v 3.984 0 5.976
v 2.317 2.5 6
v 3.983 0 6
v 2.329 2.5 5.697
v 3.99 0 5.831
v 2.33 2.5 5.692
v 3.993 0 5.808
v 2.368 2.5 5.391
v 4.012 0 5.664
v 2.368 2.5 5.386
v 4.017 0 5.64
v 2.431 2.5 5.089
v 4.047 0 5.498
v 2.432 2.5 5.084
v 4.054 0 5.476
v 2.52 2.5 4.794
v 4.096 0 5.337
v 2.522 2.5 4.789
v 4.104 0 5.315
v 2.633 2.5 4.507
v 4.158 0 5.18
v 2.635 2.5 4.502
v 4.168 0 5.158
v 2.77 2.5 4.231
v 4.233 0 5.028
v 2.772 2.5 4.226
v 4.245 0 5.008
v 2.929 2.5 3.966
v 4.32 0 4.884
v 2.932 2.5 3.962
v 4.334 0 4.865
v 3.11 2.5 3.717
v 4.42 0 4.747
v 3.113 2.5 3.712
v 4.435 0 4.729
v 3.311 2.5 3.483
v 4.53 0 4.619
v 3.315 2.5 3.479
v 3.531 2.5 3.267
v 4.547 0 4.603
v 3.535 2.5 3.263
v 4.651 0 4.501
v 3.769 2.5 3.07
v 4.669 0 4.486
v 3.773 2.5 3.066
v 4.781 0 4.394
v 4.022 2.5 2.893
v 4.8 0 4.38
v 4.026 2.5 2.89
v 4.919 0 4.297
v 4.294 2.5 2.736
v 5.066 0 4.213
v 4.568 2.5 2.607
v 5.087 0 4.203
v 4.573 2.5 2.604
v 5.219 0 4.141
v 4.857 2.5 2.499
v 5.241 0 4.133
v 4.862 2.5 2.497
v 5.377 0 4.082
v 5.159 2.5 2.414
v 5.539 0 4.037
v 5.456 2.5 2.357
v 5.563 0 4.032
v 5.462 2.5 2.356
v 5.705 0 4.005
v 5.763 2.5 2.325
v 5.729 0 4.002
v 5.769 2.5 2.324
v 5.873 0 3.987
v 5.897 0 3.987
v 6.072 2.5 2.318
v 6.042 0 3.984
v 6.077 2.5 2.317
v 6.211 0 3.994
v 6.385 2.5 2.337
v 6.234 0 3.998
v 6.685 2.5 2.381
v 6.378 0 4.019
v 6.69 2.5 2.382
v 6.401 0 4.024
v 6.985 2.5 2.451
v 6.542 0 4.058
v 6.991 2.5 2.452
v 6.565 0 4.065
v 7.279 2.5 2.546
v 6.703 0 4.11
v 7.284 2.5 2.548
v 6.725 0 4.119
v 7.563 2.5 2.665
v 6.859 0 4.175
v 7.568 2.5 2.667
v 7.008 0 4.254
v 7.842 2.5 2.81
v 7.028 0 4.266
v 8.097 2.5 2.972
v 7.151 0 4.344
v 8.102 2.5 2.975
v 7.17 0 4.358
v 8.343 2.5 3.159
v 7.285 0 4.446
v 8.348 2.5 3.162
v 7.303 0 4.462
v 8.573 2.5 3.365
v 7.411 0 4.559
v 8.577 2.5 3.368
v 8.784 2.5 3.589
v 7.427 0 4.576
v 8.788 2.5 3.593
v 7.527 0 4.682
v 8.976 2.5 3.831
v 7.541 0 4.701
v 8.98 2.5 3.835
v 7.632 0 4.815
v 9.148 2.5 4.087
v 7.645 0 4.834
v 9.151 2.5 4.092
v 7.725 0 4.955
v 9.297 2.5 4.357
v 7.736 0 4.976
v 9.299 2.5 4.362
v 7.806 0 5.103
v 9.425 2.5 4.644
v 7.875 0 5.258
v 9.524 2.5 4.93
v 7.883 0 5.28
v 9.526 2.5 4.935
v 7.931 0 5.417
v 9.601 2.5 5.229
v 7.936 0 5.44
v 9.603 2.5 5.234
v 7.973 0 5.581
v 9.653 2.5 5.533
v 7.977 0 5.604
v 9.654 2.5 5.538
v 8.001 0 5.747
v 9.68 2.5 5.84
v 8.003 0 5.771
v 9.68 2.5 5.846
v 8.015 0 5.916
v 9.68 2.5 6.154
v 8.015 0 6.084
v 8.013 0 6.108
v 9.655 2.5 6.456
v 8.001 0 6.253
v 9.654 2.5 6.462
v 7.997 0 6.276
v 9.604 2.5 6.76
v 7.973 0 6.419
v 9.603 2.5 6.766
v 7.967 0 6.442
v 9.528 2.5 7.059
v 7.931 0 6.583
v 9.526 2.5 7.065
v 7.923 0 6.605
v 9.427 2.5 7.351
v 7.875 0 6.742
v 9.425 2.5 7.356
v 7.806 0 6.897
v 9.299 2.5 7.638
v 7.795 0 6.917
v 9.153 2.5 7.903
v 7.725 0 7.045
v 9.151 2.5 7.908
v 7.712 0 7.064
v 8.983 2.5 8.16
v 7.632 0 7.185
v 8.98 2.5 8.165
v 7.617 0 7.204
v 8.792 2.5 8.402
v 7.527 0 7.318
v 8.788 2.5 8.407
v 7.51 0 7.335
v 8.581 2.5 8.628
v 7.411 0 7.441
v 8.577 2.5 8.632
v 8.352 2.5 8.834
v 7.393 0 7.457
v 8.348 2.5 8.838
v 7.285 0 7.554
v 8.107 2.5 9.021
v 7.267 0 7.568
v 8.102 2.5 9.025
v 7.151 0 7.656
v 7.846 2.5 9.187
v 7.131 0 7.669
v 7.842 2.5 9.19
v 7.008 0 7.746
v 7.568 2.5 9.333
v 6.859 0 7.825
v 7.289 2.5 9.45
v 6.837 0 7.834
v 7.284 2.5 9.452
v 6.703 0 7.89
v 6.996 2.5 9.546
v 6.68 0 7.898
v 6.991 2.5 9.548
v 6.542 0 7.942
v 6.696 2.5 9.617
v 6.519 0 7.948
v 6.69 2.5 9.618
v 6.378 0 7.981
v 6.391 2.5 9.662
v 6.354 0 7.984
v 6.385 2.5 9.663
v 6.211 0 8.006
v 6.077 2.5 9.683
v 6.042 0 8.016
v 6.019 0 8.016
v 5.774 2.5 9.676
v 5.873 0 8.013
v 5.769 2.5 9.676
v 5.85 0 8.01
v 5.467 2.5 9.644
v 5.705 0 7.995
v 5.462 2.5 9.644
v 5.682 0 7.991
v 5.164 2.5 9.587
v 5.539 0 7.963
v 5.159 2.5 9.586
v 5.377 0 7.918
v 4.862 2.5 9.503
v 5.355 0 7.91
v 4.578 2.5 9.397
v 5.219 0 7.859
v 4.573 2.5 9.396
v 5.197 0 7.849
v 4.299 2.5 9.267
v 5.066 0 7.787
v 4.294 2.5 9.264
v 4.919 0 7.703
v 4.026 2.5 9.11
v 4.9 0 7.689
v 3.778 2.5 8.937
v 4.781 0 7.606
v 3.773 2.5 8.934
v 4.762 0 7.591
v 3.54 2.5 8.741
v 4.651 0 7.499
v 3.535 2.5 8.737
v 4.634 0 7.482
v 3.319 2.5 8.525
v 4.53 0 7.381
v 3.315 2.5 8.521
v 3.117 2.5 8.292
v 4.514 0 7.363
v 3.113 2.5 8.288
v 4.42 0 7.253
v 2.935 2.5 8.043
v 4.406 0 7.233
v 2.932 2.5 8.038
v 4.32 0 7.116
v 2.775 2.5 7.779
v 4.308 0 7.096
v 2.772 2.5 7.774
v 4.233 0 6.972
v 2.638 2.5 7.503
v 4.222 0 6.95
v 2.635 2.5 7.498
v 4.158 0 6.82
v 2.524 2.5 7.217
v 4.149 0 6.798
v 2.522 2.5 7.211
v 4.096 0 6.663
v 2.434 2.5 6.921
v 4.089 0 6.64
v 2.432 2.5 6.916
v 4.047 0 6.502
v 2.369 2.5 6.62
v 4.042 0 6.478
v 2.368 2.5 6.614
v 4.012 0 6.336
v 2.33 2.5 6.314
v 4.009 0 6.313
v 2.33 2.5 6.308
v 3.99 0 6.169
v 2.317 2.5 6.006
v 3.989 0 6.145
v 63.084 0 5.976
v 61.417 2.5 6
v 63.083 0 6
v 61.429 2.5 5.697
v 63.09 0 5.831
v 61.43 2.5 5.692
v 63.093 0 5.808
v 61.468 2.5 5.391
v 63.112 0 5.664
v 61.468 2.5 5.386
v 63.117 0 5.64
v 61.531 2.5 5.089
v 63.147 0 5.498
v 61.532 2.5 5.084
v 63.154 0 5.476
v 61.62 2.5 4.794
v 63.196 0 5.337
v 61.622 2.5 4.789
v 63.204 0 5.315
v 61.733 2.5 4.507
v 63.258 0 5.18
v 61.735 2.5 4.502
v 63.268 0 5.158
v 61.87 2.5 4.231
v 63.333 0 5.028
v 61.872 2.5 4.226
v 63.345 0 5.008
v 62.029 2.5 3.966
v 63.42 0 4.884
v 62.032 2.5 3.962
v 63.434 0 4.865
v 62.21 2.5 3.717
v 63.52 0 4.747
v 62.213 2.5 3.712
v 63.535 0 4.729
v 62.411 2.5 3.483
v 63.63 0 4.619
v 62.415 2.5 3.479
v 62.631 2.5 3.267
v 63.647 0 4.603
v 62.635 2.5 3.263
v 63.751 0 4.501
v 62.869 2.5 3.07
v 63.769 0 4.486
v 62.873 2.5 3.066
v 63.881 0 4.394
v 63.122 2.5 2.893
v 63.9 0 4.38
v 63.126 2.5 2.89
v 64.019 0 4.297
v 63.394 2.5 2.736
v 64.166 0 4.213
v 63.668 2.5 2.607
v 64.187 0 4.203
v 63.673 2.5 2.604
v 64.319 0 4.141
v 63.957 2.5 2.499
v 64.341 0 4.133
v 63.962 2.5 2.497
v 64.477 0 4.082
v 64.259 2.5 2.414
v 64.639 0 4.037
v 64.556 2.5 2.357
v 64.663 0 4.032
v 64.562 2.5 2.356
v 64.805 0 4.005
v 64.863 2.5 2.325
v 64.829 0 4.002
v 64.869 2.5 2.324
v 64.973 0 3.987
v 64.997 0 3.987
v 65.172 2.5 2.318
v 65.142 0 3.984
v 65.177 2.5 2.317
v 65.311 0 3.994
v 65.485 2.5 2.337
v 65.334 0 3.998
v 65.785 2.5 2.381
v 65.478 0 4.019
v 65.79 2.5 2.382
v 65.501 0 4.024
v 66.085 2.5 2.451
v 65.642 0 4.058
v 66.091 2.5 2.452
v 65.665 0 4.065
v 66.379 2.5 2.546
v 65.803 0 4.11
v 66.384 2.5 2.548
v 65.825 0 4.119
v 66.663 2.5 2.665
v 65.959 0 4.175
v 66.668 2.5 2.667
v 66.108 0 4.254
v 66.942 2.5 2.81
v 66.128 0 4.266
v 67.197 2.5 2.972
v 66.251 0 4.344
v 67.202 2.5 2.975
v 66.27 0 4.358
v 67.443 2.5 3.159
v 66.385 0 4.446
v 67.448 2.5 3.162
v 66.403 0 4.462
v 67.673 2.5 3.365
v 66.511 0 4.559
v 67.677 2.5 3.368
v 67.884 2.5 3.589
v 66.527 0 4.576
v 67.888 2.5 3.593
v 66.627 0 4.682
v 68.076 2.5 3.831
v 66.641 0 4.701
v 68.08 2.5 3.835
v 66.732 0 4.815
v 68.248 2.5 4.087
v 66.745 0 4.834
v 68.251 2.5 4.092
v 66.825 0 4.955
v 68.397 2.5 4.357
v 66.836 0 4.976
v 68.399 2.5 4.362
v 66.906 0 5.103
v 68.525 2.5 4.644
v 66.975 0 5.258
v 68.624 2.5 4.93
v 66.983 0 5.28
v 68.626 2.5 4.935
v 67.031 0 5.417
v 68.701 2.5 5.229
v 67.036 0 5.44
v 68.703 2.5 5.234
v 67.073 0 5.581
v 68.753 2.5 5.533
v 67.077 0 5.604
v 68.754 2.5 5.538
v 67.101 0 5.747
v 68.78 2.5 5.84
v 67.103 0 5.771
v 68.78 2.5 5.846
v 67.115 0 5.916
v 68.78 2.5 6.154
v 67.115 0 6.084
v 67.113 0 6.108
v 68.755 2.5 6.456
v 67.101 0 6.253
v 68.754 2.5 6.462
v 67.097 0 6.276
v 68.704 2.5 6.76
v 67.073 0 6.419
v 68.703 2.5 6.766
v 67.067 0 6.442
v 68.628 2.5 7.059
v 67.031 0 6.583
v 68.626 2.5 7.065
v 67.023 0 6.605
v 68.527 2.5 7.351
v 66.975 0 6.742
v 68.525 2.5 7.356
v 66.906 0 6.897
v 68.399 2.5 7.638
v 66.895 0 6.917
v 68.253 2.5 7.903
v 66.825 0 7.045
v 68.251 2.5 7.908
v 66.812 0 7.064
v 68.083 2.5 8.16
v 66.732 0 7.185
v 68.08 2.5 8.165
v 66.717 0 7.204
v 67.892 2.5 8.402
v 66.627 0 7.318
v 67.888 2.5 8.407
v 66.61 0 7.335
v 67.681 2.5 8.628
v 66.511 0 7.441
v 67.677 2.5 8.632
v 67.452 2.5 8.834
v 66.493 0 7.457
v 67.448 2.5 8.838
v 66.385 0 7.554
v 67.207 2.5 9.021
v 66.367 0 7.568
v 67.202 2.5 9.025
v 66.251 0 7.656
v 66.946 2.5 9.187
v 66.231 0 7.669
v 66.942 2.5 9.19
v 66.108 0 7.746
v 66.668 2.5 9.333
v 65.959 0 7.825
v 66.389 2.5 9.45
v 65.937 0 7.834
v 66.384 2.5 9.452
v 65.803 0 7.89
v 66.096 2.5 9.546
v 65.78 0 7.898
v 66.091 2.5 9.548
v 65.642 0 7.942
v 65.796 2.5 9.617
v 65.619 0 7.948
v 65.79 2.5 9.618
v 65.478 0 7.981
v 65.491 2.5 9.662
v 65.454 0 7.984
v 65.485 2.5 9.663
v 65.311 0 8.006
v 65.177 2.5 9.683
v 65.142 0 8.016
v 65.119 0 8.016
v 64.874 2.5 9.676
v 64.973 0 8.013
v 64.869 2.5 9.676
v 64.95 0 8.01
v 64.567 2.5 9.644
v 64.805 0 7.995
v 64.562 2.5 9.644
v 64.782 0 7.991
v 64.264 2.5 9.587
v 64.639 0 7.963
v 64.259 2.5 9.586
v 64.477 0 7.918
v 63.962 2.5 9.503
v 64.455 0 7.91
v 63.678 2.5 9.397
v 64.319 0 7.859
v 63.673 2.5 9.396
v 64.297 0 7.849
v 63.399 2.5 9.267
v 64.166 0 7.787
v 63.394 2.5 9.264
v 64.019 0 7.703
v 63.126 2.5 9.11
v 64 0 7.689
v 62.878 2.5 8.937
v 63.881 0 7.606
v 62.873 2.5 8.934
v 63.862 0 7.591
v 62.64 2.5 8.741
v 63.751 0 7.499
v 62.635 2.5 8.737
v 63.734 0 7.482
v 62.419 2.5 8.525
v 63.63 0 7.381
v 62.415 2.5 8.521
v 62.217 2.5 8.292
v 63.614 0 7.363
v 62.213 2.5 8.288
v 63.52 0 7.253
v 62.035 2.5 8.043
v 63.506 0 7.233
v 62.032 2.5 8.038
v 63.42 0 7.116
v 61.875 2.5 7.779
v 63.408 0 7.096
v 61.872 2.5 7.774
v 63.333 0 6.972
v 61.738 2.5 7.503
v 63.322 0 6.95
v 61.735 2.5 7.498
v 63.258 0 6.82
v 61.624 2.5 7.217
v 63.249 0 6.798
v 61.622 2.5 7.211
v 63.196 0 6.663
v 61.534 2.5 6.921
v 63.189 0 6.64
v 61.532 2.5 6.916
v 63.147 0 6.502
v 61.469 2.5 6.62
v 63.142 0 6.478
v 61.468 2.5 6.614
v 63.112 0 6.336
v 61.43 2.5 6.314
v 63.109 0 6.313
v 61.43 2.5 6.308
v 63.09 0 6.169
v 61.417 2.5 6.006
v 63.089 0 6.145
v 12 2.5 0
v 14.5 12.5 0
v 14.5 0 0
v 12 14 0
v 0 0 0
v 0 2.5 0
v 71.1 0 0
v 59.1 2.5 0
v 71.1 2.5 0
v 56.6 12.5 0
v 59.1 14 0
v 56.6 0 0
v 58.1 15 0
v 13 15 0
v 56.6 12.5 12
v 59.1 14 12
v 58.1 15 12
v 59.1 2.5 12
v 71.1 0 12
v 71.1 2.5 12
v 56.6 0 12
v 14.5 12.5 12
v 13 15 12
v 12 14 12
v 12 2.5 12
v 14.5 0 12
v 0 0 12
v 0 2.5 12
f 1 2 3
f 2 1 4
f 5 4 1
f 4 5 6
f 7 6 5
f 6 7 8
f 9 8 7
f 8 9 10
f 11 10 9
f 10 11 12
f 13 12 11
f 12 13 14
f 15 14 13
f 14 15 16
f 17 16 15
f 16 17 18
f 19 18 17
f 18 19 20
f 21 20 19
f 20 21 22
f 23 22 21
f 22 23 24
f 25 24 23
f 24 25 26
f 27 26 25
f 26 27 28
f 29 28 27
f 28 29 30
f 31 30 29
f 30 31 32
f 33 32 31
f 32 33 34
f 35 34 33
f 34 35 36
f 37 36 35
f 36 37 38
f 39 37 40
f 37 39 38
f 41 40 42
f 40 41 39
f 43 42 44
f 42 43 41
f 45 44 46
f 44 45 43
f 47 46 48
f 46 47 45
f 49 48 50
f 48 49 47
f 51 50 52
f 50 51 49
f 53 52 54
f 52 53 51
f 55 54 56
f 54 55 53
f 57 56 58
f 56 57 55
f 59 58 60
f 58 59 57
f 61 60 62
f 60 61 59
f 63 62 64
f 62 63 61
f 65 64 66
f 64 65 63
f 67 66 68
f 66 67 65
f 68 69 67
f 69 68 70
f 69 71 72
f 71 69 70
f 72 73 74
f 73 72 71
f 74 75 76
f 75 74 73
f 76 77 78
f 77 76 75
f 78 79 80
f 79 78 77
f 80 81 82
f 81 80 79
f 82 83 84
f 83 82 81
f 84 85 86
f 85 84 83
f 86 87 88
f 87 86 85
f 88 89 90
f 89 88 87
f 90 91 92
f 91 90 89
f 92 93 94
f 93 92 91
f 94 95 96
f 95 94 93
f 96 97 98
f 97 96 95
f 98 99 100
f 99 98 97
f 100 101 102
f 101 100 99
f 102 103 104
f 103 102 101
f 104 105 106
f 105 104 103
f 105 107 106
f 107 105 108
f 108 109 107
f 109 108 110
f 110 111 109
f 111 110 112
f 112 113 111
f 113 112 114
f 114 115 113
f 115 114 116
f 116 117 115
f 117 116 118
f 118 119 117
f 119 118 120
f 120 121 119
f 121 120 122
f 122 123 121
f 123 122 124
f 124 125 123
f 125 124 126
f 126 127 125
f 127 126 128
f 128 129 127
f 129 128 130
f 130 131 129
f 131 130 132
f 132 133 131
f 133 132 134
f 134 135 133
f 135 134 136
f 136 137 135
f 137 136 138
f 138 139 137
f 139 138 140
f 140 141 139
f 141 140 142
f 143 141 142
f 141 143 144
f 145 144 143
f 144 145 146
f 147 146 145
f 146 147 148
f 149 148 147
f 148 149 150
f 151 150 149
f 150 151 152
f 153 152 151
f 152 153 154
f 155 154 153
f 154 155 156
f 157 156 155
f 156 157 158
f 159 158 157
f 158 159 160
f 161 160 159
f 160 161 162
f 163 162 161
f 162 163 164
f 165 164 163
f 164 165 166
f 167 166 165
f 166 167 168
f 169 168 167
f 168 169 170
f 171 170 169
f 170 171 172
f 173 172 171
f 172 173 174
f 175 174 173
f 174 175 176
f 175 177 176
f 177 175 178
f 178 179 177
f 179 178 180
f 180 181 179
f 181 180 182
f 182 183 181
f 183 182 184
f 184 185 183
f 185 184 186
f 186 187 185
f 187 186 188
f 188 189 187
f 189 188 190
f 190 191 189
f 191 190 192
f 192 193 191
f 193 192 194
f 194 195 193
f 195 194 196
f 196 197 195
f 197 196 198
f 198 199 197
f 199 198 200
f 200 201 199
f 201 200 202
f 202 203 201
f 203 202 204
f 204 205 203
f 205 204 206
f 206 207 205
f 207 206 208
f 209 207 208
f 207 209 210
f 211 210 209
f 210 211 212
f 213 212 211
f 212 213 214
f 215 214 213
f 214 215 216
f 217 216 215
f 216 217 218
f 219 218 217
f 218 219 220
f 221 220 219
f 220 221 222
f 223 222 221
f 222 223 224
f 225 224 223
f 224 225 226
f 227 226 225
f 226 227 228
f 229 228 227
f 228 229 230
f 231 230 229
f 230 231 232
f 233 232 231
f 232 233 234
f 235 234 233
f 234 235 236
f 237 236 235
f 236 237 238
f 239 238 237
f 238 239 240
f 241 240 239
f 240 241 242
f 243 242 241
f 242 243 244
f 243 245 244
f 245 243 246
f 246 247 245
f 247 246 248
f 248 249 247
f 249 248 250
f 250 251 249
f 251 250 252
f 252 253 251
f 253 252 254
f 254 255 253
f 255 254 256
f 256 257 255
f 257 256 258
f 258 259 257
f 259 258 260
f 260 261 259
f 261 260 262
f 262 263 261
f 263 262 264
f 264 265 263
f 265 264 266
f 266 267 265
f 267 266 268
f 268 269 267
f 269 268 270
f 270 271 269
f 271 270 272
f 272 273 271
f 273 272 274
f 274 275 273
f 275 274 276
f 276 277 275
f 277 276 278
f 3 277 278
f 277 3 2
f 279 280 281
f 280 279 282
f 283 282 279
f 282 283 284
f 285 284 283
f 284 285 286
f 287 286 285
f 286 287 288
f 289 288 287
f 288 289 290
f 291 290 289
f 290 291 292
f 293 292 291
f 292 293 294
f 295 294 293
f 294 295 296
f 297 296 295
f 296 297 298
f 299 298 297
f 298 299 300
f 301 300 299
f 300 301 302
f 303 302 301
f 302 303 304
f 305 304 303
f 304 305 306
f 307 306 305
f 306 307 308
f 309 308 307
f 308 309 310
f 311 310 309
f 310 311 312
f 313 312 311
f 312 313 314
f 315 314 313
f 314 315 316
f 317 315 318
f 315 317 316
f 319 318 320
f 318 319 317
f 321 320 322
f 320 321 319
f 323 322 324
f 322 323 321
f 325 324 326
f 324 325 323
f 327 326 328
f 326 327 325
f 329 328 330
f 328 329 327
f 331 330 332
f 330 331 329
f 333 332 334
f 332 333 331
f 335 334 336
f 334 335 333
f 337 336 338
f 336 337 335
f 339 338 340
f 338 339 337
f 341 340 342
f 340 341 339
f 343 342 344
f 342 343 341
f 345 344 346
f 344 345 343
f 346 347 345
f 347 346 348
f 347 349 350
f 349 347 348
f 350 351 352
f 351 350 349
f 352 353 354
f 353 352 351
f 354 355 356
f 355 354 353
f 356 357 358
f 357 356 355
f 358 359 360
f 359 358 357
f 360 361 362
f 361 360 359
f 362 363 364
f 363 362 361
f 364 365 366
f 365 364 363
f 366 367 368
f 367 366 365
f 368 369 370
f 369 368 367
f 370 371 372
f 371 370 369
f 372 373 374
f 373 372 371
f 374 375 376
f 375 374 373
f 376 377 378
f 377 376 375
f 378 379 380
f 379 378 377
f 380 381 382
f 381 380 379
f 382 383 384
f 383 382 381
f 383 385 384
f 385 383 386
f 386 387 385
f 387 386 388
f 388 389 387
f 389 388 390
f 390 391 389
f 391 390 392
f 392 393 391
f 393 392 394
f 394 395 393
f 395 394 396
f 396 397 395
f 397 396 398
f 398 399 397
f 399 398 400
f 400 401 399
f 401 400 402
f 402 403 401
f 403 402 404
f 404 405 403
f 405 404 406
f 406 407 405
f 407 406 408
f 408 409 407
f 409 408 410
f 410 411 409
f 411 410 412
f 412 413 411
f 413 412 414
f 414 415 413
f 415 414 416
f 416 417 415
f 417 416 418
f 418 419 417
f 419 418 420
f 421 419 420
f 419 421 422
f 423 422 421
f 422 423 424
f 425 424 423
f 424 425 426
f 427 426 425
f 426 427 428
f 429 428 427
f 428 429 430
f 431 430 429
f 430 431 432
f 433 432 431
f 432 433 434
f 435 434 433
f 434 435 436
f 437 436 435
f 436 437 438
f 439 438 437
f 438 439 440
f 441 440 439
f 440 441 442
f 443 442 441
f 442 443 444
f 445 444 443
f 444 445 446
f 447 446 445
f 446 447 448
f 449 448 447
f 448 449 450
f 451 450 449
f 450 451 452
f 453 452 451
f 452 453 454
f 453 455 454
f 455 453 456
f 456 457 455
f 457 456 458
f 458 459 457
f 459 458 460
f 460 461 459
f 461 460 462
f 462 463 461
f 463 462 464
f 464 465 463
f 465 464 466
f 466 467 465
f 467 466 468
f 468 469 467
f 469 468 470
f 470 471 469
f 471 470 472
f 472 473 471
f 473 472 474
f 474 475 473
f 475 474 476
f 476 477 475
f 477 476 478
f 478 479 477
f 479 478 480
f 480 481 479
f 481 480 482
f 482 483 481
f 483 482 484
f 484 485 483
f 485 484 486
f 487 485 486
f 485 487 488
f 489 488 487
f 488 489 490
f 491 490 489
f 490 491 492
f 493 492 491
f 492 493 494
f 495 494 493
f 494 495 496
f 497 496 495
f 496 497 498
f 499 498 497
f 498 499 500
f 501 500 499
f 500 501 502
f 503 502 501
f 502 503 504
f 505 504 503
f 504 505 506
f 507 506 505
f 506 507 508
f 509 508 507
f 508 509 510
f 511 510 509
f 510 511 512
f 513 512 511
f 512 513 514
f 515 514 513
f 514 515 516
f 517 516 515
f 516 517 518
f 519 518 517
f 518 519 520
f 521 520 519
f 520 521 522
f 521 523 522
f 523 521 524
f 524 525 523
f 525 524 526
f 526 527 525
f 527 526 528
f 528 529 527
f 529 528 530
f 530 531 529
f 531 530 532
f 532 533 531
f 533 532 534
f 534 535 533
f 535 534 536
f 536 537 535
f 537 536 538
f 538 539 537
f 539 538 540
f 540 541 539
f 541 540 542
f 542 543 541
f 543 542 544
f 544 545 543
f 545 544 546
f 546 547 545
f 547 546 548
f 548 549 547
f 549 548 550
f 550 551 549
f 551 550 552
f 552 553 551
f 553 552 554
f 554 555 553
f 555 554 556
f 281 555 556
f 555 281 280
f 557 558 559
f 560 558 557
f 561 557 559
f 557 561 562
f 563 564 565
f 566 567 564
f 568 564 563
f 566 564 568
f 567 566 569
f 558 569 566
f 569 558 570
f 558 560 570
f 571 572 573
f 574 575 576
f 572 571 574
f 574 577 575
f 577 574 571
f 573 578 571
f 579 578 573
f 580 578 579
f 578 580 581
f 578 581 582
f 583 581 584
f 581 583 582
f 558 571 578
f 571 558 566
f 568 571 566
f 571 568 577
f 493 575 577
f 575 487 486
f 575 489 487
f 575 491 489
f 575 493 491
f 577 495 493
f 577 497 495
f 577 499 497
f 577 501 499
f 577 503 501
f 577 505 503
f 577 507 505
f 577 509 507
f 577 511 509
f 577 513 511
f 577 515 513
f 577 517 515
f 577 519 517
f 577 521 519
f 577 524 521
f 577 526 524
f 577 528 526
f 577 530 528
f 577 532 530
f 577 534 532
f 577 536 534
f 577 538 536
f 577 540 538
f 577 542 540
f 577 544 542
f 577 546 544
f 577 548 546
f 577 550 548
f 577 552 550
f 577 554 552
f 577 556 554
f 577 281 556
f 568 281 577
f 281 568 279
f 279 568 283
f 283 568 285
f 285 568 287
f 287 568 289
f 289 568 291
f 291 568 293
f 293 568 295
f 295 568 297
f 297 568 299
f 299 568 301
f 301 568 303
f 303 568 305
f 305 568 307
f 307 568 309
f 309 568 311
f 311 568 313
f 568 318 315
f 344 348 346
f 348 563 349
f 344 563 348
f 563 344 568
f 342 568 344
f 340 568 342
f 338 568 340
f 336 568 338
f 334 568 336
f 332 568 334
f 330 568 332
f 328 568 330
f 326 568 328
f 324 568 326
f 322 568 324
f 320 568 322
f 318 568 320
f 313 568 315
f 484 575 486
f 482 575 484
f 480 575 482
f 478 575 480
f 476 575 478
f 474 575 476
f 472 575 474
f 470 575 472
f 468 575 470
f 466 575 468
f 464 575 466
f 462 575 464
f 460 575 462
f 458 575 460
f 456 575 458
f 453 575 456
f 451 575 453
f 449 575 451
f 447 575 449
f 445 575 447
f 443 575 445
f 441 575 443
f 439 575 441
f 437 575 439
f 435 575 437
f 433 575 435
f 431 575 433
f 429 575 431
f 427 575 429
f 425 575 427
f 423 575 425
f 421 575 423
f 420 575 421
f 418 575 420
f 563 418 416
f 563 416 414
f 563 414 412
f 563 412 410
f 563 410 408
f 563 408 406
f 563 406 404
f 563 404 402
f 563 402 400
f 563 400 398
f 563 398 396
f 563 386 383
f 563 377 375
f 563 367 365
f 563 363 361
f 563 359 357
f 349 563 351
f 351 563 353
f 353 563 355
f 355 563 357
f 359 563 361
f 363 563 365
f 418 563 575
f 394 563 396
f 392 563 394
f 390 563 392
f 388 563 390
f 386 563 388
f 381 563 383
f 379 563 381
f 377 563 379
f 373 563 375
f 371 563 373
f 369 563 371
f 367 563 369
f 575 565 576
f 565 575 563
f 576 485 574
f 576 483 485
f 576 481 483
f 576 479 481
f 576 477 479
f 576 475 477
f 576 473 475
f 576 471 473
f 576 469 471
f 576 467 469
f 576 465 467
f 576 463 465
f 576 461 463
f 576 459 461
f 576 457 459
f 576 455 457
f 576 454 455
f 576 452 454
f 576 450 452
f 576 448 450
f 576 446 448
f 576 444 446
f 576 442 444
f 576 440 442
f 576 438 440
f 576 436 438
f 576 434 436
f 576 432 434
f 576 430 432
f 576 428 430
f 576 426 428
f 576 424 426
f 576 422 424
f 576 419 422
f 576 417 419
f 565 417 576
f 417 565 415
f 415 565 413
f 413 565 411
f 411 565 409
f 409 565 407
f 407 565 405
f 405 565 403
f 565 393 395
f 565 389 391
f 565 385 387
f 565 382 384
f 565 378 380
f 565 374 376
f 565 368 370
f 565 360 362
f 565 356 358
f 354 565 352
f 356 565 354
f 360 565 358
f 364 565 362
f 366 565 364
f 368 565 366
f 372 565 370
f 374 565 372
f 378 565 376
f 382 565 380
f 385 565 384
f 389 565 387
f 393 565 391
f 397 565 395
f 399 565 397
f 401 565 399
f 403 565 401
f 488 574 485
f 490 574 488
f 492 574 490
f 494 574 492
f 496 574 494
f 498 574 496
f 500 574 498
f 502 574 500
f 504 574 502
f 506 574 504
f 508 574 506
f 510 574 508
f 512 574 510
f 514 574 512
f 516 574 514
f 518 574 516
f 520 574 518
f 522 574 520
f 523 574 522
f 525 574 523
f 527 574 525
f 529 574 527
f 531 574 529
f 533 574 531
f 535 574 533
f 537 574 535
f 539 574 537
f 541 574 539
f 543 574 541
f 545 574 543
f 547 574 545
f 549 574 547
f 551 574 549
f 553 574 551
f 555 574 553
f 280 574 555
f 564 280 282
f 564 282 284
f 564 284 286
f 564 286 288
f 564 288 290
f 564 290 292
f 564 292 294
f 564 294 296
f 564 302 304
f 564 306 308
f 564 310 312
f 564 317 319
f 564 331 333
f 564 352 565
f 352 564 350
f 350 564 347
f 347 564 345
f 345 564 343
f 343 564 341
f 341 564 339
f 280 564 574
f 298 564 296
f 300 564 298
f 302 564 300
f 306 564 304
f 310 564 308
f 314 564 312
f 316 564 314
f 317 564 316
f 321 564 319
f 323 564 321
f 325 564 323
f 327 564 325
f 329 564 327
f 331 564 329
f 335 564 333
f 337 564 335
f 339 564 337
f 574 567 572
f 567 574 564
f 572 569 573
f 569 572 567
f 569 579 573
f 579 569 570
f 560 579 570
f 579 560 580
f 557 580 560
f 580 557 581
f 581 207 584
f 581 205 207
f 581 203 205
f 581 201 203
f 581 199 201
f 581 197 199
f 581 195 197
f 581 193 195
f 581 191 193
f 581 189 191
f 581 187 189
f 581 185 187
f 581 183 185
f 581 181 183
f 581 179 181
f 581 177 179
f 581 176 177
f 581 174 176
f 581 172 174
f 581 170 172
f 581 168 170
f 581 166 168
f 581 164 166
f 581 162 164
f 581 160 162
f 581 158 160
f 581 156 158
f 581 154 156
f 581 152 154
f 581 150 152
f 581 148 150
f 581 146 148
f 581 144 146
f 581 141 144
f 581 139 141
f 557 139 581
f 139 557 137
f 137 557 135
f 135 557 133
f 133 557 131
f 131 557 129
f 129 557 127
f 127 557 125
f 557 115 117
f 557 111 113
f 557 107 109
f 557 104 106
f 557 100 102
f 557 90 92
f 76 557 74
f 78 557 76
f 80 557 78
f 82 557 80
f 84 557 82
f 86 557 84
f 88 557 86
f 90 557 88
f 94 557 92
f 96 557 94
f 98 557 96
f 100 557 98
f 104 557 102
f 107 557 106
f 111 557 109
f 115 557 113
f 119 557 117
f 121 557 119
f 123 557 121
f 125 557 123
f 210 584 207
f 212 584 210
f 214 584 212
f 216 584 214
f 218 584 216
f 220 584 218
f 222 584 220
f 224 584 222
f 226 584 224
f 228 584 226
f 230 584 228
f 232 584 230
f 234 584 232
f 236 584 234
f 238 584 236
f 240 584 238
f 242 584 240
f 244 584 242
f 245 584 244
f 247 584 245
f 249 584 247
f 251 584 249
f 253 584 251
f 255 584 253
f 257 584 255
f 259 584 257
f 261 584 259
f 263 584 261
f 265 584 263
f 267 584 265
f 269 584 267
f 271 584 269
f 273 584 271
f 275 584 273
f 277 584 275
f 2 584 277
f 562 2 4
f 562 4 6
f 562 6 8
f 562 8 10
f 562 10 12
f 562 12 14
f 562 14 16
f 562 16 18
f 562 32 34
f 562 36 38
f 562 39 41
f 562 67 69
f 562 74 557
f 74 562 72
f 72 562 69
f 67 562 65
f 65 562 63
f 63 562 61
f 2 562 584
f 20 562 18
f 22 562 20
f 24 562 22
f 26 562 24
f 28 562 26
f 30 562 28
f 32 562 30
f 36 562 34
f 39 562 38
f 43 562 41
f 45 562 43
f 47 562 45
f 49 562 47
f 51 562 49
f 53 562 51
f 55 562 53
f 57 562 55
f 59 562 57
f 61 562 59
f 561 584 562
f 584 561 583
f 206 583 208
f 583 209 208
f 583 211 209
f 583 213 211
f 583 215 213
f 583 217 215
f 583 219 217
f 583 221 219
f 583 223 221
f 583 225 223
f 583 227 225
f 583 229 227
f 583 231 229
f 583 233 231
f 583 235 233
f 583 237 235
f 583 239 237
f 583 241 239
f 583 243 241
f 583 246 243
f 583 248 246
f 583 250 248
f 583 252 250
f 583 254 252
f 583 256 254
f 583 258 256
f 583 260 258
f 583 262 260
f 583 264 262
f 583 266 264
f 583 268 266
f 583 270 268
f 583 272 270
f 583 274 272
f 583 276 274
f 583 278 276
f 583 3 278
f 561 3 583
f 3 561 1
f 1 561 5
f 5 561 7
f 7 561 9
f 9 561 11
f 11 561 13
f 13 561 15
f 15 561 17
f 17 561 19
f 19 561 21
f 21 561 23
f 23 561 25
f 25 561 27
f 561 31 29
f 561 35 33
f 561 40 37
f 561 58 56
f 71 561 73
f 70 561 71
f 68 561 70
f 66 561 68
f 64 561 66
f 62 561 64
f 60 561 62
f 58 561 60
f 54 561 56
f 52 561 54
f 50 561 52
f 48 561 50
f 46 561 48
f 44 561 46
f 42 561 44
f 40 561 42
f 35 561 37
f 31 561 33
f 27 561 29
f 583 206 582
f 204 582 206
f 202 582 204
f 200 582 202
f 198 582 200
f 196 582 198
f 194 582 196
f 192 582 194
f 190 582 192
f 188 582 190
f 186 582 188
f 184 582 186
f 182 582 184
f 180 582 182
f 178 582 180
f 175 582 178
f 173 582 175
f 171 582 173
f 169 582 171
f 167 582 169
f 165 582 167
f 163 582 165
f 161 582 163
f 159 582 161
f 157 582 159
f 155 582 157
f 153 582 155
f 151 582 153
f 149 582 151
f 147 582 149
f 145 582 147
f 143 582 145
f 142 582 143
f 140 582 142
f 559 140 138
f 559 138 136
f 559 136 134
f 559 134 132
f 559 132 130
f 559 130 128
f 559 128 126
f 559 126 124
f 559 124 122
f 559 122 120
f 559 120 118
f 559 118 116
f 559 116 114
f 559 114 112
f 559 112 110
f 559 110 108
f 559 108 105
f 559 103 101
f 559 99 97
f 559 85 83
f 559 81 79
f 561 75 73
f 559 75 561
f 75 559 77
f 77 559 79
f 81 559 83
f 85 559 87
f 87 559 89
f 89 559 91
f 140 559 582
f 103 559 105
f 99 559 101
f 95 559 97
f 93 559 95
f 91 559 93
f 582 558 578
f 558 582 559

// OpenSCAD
// file: Parts/Screw.scad
// created by IndiePandaaaaa | Lukas

TOLERANCE = .1;
$fn = $preview ? 30 : 75;

// metric standards                          M1   M2   M3   M4   M5 M6 M7   M8   M9  M10
function screw_metric_corehole(standard) = [.75, 1.6, 2.5, 3.3, 4.2, 5, 6, 6.8, 7.8, 8.5][standard - 1];
function screw_metric_borehole(standard) = [0, 0, 3.4, 4.5, 5.5, 6.6, 0, 9, 0, 11][standard - 1];
function screw_metric_countersunk_height(standard) = [0, 0, 1.7, 2.3, 2.8, 3.3, 0, 4.4, 0, 5.5][standard - 1];
function screw_metric_countersunk_od(standard) = standard * 2;

module screw_metric_countersunk(standard, length, unthreaded_length = 0, borehole_length = 0, tolerance = .15) {
  if (screw_metric_corehole(standard=standard) == 0) echo("ERROR: screw_metric_corehole value has not been set yet.");
  if (screw_metric_borehole(standard=standard) == 0) echo("ERROR: screw_metric_borehole value has not been set yet.");
  if (screw_metric_countersunk_height(standard=standard) == 0) echo("ERROR: screw_metric_countersunk_height value has not been set yet.");

  union() {
    translate(v=[0, 0, -.1]) {
      cylinder(h=.2 + borehole_length, d=screw_metric_countersunk_od(standard) + tolerance, center=false);
      translate(v=[0, 0, -screw_metric_countersunk_height(standard)]) {
        cylinder(h=screw_metric_countersunk_height(standard) + .01, d2=screw_metric_countersunk_od(standard) + tolerance, d1=screw_metric_borehole(standard) + tolerance, center=false);
        translate(v=[0, 0, -.1]) cylinder(h=.1, d=screw_metric_borehole(standard) + tolerance, center=false);
      }
    }
    translate(v=[0, 0, -length]) cylinder(h=length, d=screw_metric_corehole(standard) + tolerance, center=false);

    // unthreaded part
    translate(v=[0, 0, -.1 - screw_metric_countersunk_height(standard) - unthreaded_length]) cylinder(h=unthreaded_length + .1, d=screw_metric_borehole(standard) + tolerance, center=false);
  }
}

// TODO: module metric cylindric head screws

// TODO: module metric rounded head screws

function screw_wood_corehole(diameter) = diameter * 0.75;
function screw_wood_borehole(diameter) = diameter * 1.25;
function screw_wood_countersunk_height(diameter) = diameter * 0.75;

module screw_wood_countersunk(diameter, length, unthreaded_length = 0, tolerance = .15) {
  if (screw_metric_corehole(standard=standard) == 0) echo("ERROR: screw_metric_corehole value has not been set yet.");
  if (screw_metric_borehole(standard=standard) == 0) echo("ERROR: screw_metric_borehole value has not been set yet.");
  if (screw_metric_countersunk_height(standard=standard) == 0) echo("ERROR: screw_metric_countersunk_height value has not been set yet.");

  // TODO: add module for wood screws 
  union(){}
}

// TODO: module wood cylindric head screws

// TODO: module wood rounded head screws

function cone_diameter(diameter) = diameter * 2;
function cone_diameter_cutout(diameter) = diameter * 2 + 0.5;
function cone_height(diameter) = diameter * 0.75;

module screw(diameter, length = 12, cutout_sample = false) {
  module base_model(diameter, length, cone_height, cone_diameter, offset = 0) {
    rotate_extrude(angle=360) {
      polygon(
        [
          [0, 0],
          [(diameter + offset) / 2, 0],
          [(diameter + offset) / 2, (length + offset) - (cone_height + offset)],
          [(cone_diameter + offset) / 2, length + offset],
          [0, length + offset],
        ]
      );
    }
  }

  if (length < diameter) {
    echo("Screw is too short");
    length = diameter + 5;
    echo("New length is: ", length);
  }

  if (!cutout_sample) {
    translate([0, 0, -length])
      difference() {
        base_model(diameter, length, cone_height(diameter), cone_diameter(diameter));

        // top cross part
        translate([0, 0, length - (cone_height(diameter) - diameter / 2) + .1])
          difference() {
            rotate([0, 0, 45])
              rotate_extrude(angle=360) {
                polygon(
                  [
                    [0, 0],
                    [diameter * 1.4 / 2, 0],
                    [cone_diameter(diameter) / 3, cone_height(diameter) - diameter / 2],
                    [0, cone_height(diameter) - diameter / 2],
                  ]
                );
              }
            for (i = [0:1:3]) {
              rotate([0, 0, 90 * i])
                translate([diameter / 3.18 / 2, diameter / 3.18 / 2, 0]) cube(cone_height(diameter));
            }
          }
      }
  } else {
    offset = 0;
    diameter = cone_diameter_cutout(diameter) / 2; // is duplicated by function, used to reduce error
    translate([0, 0, -length - offset / 2]) {
      base_model(diameter, length, cone_height(diameter), cone_diameter(diameter), offset);
      translate([0, 0, length - .005]) cylinder(r=diameter, h=50);
    }
  }
}

module screw_corehole(diameter_screw, diameter_core, unthreaded_length, length = 12) {
  union() {
    screw(diameter=diameter_screw, length=unthreaded_length, cutout_sample=true);
    if (unthreaded_length < diameter_core - .1) {
      translate(v=[0, 0, -diameter_screw * .8]) cylinder(h=diameter_screw, d=diameter_screw + .3, center=false);
    }
    translate([0, 0, -length]) cylinder(d=diameter_core, h=length - unthreaded_length + .1);
  }
}

module screw_with_nut_metric(screw_length, diameter, square_channel = false, tolerance = .1) {
  function od(width) = ( (width / 2) / cos(30)) * 2; // calculates nut diameter from given width
  nut_thickness = [0.8, 1.6, 2.4, 3.2, 4, 5, 5.5, 6.5];
  nut_width = [2.5, 4, 5.5, 7.1, 8.1, 10.1, 11.1, 13.1];

  if (!(0 < diameter && diameter <= 8 && diameter == round(diameter))) {
    echo("module is only defined for integer values from M1 to M8.");
  } else {
    union() {
      if (!square_channel) {
        screw(diameter=diameter, length=screw_length, cutout_sample=true);

        translate([0, 0, -(screw_length * 2 - nut_thickness[diameter - 1])])
          cylinder(d=od(nut_width[diameter - 1]) + tolerance, h=screw_length, $fn=6);
      } else {
        screw(diameter=diameter, length=screw_length + diameter, cutout_sample=true);
        translate([-od(nut_width[diameter - 1]) / 2 - tolerance, -(nut_width[diameter - 1] / 2), -(screw_length)])
          cube([od(nut_width[diameter - 1]) + screw_length, nut_width[diameter - 1] + tolerance, nut_thickness[diameter - 1] + tolerance]);
      }
    }
  }
}

translate(v=[0, 0, 0]) screw(diameter=3.5, length=12, cutout_sample=false);
translate(v=[20, 0, 0]) screw_corehole(diameter_screw=3, diameter_core=2.5, unthreaded_length=15, length=20);
translate(v=[40, 0, 0]) screw_with_nut(screw_length=30, diameter=4, square_channel=false, tolerance=.1);
translate(v=[60, 0, 0]) SCREW_METRIC_COUNTERSUNK(standard=3, length=12, unthreaded_length=5, borehole_length=5);
// main file
// created by IndiePandaaaaa|Lukas
// encoding: utf-8

use <Parts/Screw.scad>

$fn = $preview ? 25 : 75;

// DEFAULT VALUES
DEVICE_WIDTH = 42;
DEVICE_HEIGHT = 12.5;

//DIGITUS Ultra Slim HDMI Splitter DS-45322 DEVICE_WIDTH = 83.1; DEVICE_HEIGHT = 8.9;
//LOGILINK Digital to Analog Audio Converter CA0101 v2 DEVICE_WIDTH = 53.5; DEVICE_HEIGHT = 21.5;
//DELL 130W PSU DEVICE_WIDTH = 76.2; DEVICE_HEIGHT = 24.4;
//HP 120W PSU DEVICE_WIDTH = 68.6; DEVICE_HEIGHT = 25.2;
//USB Cable Plug DEVICE_WIDTH = 11; DEVICE_HEIGHT = 14.5;
//ATX PSU DEVICE_WIDTH = 150; DEVICE_HEIGHT = 86;
//PSVR Y-Cable Bridge DEVICE_WIDTH = 14.4; DEVICE_HEIGHT = 8;

MATERIAL_THICKNESS = 2.5;
SCREW_DIAMETER = 3.5;

module Bracket(screwSocketWidth, thicknessBracket, deviceWidth, deviceHeight, chamfer = 1) {
  uBracket(screwSocketWidth=screwSocketWidth, thicknessBracket=thicknessBracket, deviceWidth=deviceWidth, deviceHeight=deviceHeight);
}

module uBracket(screwSocketWidth, thicknessBracket, deviceWidth, deviceHeight, chamfer = 1) {
  difference() {
    screwSocketWidth = SCREW_DIAMETER * 2 + 5;

    deviceWidth = deviceWidth + 0.1; // added .1 for tolerance issues
    linear_extrude(height=screwSocketWidth) {
      endWidth = (screwSocketWidth + thicknessBracket) * 2;
      polygon(
        points=[
          [0, 0],
          [screwSocketWidth + thicknessBracket, 0],
          [screwSocketWidth + thicknessBracket, deviceHeight],
          [screwSocketWidth + thicknessBracket + deviceWidth, deviceHeight],
          [screwSocketWidth + thicknessBracket + deviceWidth, 0],
          [endWidth + deviceWidth, 0],
          [endWidth + deviceWidth, thicknessBracket],
          [screwSocketWidth + thicknessBracket + deviceWidth + thicknessBracket, thicknessBracket],
          [
            screwSocketWidth + thicknessBracket + deviceWidth + thicknessBracket,
            deviceHeight + thicknessBracket - chamfer,
          ],
          [
            screwSocketWidth + thicknessBracket + deviceWidth + thicknessBracket - chamfer,
            deviceHeight + thicknessBracket,
          ],
          [screwSocketWidth + chamfer, deviceHeight + thicknessBracket],
          [screwSocketWidth, deviceHeight + thicknessBracket - chamfer],
          [screwSocketWidth, thicknessBracket],
          [0, thicknessBracket],
        ]
      );
    }

    for (i = [0:1]) {
      translate(
        [
          screwSocketWidth / 2 + (screwSocketWidth + deviceWidth + thicknessBracket * 2) * i,
          thicknessBracket + .1,
          screwSocketWidth / 2,
        ]
      )
        rotate([-90, 0, 0])
          screw(SCREW_DIAMETER, 12, true);
    }
  }
}
uBracket(screwSocketWidth=SCREW_DIAMETER * 4, thicknessBracket=MATERIAL_THICKNESS, deviceWidth=DEVICE_WIDTH, deviceHeight=DEVICE_HEIGHT, chamfer=1);
